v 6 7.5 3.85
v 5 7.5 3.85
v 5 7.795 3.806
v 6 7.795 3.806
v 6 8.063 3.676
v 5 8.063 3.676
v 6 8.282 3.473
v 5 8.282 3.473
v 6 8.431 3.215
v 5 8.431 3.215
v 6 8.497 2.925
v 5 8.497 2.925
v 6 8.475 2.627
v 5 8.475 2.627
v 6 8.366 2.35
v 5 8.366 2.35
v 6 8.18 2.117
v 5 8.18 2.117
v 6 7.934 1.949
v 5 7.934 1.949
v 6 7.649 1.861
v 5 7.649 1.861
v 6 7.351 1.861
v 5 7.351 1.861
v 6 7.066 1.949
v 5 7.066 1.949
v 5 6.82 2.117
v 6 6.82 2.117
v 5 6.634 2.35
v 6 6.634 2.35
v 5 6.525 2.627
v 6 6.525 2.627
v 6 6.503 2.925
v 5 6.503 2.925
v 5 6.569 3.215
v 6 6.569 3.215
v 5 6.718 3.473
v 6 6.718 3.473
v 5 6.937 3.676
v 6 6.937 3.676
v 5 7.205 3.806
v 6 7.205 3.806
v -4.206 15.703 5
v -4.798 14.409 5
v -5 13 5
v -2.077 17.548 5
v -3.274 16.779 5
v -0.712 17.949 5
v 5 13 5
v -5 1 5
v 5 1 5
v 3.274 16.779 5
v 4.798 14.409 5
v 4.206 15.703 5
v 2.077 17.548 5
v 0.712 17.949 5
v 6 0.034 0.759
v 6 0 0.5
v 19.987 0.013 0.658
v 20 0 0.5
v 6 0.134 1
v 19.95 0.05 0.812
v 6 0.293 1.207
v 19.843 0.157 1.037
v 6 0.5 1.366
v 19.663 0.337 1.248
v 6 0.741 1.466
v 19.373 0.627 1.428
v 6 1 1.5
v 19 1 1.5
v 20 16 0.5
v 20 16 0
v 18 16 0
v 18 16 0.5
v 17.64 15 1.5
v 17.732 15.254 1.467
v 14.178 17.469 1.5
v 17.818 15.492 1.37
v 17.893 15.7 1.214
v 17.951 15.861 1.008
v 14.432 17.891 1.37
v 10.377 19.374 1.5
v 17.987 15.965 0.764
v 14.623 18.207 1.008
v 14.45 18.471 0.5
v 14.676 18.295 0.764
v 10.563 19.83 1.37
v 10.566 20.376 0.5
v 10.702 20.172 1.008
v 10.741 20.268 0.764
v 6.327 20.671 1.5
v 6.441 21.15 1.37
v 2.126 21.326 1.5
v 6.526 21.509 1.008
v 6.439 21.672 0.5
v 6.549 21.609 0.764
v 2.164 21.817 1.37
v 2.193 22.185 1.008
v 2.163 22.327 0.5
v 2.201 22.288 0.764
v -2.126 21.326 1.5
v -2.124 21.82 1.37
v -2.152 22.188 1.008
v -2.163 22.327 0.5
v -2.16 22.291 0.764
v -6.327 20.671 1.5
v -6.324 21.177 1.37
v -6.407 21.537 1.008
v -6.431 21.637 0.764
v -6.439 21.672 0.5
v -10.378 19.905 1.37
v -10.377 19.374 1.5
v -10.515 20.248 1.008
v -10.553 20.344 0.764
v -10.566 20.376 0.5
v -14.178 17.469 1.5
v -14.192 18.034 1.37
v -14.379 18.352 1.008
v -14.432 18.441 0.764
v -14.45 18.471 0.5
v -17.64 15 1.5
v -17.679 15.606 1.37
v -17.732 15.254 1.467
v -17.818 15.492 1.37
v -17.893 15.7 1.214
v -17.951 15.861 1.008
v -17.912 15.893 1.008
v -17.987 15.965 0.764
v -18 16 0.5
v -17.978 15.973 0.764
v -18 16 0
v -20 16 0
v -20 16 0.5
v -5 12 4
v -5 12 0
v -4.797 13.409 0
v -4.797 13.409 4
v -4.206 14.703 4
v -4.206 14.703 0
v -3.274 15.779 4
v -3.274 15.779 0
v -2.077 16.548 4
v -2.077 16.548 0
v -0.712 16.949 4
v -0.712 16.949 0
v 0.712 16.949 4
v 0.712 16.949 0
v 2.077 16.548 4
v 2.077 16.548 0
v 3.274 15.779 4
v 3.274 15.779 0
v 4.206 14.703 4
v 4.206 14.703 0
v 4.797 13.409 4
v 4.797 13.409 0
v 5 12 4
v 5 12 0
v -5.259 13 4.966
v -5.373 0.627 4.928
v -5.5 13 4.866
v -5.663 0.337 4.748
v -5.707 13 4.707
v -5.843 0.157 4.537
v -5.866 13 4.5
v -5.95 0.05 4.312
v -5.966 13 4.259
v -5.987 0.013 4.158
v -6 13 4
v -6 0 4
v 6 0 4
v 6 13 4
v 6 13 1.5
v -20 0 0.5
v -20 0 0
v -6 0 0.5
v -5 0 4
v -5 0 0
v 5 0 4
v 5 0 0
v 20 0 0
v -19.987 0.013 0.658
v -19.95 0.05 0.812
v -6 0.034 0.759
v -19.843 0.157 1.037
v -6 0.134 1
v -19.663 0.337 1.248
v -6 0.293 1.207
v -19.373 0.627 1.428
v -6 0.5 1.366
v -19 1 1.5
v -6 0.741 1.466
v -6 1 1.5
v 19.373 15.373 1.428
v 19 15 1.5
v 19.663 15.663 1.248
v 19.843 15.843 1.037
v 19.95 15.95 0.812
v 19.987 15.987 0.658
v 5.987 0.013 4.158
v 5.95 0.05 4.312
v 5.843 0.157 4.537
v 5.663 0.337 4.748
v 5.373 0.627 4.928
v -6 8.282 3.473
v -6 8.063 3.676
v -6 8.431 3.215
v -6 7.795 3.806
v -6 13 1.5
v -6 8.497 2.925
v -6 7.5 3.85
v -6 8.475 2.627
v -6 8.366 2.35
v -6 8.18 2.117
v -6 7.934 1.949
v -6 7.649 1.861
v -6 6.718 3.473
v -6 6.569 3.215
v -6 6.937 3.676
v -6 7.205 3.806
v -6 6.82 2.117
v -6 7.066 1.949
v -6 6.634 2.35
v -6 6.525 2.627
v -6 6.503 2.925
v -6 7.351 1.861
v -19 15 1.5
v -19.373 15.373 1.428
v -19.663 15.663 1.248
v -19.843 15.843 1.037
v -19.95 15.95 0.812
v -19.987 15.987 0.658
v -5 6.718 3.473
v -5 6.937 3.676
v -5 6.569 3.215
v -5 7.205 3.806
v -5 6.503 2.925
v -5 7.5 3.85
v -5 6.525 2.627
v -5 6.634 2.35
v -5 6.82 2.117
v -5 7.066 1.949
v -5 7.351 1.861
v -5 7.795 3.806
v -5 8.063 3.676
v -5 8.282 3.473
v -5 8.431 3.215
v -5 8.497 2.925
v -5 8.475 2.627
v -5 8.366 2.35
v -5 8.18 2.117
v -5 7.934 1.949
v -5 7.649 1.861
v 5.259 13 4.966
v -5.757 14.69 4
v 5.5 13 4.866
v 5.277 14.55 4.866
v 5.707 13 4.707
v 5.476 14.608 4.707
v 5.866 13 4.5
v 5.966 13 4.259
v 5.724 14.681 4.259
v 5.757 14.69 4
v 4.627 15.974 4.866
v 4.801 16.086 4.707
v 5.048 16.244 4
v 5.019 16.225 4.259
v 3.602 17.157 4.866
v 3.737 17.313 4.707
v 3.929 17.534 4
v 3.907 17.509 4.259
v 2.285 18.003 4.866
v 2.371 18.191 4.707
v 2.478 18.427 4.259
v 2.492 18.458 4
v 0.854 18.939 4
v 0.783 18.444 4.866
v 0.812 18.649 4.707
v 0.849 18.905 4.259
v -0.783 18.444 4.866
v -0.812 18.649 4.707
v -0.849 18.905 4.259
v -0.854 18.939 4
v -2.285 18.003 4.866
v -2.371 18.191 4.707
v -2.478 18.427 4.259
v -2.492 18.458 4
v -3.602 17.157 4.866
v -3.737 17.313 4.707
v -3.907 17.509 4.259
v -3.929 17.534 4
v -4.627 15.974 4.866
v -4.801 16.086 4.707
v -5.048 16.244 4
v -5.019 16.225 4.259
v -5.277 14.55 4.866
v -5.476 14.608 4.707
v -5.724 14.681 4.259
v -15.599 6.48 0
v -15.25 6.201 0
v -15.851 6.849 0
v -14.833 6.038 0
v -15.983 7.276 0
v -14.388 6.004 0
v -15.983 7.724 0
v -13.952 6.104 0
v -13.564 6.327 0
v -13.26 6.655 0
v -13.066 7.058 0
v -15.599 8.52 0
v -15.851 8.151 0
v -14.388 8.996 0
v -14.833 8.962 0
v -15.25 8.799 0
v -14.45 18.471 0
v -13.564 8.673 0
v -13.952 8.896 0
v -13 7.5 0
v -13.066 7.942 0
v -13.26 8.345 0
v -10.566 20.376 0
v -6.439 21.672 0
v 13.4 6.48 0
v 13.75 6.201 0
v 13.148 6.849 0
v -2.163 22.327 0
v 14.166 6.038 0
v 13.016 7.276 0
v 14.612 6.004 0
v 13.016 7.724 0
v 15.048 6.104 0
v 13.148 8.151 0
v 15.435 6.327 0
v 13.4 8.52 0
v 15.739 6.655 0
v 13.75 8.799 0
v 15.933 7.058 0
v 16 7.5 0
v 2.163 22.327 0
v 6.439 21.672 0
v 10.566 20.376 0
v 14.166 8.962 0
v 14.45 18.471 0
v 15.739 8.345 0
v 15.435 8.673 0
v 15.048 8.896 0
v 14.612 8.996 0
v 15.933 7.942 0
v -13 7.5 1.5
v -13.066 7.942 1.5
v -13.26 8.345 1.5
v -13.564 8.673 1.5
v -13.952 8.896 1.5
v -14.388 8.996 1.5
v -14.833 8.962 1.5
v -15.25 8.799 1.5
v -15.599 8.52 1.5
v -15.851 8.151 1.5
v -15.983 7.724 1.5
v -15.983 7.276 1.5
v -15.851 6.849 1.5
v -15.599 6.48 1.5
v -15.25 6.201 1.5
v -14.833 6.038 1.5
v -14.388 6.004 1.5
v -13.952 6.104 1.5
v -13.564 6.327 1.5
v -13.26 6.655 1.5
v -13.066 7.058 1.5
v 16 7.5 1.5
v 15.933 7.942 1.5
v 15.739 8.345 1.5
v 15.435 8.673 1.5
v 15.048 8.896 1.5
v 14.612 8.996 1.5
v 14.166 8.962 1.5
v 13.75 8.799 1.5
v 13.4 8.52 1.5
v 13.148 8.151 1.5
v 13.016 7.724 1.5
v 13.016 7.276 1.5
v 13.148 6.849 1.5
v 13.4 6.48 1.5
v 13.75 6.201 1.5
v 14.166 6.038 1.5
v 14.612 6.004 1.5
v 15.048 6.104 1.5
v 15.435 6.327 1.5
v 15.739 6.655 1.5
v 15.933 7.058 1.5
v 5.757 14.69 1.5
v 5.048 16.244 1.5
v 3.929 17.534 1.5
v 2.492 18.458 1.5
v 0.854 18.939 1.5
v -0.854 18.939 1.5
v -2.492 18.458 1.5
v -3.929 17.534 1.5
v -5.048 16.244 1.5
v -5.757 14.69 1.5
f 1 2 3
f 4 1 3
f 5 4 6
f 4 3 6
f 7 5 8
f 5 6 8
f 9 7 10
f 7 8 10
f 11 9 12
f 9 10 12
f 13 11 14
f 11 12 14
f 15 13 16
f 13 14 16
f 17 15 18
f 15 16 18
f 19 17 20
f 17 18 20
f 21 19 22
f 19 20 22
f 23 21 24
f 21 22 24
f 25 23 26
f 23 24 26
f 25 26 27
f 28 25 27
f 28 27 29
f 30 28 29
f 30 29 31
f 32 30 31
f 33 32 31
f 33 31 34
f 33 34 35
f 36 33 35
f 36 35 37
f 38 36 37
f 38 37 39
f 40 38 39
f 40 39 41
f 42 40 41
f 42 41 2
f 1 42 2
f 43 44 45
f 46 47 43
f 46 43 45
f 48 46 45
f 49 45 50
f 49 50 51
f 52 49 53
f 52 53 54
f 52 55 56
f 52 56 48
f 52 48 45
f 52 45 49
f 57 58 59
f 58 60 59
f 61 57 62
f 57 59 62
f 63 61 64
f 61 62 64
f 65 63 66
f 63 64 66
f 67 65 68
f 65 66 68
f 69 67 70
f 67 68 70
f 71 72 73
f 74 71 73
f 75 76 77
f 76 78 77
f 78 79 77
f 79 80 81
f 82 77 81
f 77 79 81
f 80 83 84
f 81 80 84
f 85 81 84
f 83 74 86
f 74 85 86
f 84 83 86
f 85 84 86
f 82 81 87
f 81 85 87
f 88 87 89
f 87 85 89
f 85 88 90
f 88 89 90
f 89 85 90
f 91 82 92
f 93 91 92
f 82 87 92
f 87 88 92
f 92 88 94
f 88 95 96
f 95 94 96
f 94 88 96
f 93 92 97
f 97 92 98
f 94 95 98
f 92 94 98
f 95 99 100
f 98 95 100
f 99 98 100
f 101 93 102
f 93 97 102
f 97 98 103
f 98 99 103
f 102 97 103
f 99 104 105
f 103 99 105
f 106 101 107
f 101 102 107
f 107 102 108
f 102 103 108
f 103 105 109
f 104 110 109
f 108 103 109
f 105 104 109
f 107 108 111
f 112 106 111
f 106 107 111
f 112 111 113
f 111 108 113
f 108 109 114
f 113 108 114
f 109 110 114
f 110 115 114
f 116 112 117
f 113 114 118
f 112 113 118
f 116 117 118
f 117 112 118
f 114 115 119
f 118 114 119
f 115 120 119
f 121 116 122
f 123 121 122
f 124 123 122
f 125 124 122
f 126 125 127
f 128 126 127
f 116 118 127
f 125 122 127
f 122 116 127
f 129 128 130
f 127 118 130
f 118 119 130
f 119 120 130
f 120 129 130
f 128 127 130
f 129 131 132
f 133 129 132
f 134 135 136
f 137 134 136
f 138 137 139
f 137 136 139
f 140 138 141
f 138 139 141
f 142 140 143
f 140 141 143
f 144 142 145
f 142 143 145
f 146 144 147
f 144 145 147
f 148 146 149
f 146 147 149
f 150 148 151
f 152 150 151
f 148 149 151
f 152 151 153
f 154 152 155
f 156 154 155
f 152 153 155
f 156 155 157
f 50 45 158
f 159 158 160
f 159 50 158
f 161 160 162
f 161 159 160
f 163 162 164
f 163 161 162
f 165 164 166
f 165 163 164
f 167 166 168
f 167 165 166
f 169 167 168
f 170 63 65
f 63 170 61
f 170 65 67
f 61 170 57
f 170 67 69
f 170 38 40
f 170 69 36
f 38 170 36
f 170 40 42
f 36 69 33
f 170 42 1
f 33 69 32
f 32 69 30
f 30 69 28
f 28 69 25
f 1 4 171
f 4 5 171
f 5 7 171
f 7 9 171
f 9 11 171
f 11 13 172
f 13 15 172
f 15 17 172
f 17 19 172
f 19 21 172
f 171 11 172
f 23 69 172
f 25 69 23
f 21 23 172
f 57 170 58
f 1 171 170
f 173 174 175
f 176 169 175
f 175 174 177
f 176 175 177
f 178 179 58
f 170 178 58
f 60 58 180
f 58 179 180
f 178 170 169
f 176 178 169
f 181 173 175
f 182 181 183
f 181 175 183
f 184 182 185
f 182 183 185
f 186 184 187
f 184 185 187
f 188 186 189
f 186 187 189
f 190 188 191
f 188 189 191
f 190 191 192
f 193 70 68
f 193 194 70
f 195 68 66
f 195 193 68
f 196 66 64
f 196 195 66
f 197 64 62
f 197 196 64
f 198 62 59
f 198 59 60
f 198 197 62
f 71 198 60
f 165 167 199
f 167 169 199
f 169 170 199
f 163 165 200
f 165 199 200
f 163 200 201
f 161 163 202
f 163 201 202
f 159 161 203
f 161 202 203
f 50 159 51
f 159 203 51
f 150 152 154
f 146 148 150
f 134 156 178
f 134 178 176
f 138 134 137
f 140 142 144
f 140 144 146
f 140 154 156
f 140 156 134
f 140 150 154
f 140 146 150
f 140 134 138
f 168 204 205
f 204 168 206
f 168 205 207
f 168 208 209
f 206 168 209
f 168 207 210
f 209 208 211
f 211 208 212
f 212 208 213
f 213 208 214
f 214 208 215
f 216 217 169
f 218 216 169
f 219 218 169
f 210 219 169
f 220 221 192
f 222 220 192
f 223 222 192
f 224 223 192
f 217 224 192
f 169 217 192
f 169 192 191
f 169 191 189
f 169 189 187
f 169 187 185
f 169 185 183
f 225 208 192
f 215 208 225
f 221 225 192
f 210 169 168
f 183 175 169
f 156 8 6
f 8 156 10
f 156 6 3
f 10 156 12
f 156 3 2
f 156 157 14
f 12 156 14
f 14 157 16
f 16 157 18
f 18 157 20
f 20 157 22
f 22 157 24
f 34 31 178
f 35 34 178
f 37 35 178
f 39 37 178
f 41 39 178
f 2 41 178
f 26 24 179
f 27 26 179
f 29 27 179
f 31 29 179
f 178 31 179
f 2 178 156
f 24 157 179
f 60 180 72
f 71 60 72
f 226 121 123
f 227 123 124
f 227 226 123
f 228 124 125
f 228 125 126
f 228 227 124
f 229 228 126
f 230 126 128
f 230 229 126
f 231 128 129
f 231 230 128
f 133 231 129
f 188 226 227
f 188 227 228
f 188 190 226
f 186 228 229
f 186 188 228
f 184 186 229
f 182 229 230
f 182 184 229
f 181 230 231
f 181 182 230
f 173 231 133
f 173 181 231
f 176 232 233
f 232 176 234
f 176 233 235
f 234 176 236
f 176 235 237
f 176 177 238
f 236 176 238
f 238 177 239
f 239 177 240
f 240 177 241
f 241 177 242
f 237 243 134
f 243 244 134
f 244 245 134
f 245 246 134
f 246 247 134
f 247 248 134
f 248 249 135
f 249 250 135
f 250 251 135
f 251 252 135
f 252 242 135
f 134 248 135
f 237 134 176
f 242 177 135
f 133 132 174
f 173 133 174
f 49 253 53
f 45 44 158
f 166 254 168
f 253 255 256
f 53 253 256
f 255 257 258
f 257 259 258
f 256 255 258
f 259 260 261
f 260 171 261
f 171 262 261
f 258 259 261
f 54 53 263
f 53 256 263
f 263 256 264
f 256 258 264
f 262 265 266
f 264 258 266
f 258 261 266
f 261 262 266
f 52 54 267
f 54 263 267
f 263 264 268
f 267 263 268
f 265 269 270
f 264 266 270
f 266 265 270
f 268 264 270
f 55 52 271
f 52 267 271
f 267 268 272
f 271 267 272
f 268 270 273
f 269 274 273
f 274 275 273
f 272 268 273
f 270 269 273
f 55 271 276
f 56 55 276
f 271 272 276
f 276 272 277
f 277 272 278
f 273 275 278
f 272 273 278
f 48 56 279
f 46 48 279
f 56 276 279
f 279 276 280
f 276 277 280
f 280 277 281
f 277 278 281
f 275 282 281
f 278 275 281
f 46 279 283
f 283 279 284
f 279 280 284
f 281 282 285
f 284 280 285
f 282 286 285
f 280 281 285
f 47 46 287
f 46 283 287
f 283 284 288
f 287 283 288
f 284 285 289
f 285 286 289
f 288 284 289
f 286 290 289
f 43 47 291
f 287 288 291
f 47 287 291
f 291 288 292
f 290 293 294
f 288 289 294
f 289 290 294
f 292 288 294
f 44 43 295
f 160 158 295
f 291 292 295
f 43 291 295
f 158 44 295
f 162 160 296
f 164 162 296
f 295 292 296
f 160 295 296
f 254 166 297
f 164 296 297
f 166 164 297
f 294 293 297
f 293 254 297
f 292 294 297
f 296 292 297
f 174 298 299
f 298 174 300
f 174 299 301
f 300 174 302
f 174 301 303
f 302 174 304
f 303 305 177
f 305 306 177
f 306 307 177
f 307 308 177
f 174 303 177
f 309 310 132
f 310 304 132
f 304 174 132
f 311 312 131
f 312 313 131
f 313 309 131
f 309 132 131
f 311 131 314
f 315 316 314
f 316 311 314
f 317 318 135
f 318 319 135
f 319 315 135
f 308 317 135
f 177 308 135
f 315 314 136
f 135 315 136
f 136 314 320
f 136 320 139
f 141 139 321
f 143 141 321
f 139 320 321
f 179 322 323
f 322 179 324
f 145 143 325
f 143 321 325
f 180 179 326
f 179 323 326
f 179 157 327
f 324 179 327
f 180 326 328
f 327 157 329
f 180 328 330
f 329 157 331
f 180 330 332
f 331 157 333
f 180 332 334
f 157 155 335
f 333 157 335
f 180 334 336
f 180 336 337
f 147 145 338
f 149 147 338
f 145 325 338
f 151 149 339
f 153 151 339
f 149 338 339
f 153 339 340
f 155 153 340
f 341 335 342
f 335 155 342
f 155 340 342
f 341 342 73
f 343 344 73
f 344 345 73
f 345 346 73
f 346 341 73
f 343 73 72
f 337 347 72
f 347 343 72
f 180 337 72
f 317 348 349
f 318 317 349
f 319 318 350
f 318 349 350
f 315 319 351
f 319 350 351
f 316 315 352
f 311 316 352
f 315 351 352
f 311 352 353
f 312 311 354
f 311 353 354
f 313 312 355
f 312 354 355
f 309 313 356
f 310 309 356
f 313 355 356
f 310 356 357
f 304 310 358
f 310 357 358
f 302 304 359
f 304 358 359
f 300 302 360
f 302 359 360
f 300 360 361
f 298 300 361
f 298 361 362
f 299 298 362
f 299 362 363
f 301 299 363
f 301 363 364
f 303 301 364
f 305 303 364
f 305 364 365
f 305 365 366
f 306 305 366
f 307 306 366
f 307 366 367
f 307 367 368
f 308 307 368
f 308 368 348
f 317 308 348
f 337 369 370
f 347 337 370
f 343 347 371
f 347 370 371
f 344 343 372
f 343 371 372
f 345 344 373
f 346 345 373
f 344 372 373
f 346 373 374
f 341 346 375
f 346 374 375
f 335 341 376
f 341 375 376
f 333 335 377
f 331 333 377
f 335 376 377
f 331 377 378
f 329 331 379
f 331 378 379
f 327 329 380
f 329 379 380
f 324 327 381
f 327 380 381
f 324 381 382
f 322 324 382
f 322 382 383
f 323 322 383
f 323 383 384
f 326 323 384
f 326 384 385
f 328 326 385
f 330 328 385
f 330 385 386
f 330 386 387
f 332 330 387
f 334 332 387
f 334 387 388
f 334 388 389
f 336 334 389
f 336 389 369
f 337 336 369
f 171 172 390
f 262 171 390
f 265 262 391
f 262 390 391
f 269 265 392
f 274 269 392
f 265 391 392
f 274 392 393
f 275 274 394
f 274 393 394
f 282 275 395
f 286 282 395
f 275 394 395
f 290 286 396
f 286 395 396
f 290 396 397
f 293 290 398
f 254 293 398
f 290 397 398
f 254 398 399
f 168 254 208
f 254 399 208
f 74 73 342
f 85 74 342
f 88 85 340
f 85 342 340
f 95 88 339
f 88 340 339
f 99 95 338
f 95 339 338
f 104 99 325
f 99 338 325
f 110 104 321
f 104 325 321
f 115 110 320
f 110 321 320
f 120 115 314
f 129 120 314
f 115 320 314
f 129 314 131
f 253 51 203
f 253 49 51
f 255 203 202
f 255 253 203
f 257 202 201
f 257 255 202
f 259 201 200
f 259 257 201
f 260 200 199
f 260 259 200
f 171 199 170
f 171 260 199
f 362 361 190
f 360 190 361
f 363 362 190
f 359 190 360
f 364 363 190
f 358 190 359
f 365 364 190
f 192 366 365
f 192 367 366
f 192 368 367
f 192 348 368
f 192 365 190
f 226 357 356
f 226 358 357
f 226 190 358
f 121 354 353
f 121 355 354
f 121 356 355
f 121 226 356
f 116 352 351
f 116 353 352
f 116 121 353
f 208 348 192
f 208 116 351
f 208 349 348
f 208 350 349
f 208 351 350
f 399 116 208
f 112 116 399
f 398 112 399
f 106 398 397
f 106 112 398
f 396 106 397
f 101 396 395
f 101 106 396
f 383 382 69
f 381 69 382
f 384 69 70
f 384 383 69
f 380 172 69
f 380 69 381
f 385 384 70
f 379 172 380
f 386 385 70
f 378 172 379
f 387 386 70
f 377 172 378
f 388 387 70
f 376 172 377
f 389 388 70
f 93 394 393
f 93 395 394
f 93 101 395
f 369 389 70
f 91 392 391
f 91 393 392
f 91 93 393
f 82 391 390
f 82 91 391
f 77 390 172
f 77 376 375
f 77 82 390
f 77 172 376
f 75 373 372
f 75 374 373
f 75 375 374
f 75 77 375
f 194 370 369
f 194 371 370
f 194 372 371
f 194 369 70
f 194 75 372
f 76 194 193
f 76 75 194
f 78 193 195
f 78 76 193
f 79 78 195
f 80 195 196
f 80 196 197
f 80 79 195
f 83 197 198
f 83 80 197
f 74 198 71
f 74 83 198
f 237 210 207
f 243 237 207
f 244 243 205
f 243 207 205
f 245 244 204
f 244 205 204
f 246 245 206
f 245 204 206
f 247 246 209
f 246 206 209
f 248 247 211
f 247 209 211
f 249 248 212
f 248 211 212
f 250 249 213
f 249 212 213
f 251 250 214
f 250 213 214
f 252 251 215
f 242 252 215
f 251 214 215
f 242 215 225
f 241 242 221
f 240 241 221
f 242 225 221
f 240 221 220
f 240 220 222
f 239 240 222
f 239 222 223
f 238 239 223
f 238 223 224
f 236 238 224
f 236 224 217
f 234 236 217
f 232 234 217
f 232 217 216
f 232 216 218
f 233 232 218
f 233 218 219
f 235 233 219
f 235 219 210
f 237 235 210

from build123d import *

# Parameters (mm, degrees)
BOSS_EXTRUDE1_DEPTH = 1.5
BOSS_EXTRUDE2_DEPTH = 3.5
CUT_EXTRUDE1_DEPTH  = 4
FILLET1_R           = 1
FILLET4_R           = 1
SKETCH5_R           = 1.5
CUT_EXTRUDE3_DEPTH  = 12
SKETCH4_R           = 1
CUT_EXTRUDE5_DEPTH  = 20


with BuildPart() as part:
    # Sketch1 → Boss-Extrude1 (new body)
    with BuildSketch(Plane.XY):
        with BuildLine():
            Line((0, 0), (20, 0))
            Line((20, 0), (20, 16))
            Line((20, 16), (18, 16))
            ThreePointArc((18, 16), (0, 22.408858912), (-18, 16))
            Line((-18, 16), (-20, 16))
            Line((-20, 16), (-20, 0))
            Line((-20, 0), (0, 0))
        make_face()
    extrude(amount=BOSS_EXTRUDE1_DEPTH)

    # Sketch2 → Boss-Extrude2 (add)
    with BuildSketch(Plane.XY.offset(1.5)):
        with BuildLine():
            Line((6, 0), (6, 13))
            ThreePointArc((6, 13), (0, 19), (-6, 13))
            Line((-6, 13), (-6, 0))
            Line((-6, 0), (6, 0))
        make_face()
    extrude(amount=BOSS_EXTRUDE2_DEPTH)

    # Sketch3 → Cut-Extrude1 (cut)
    with BuildSketch(Plane(origin=(0, 0, 0), x_dir=(-1, 0, 0), z_dir=(0, 0, -1))):
        with BuildLine():
            Line((0, 0), (5, 0))
            Line((5, 0), (5, 12))
            ThreePointArc((5, 12), (0, 17), (-5, 12))
            Line((-5, 12), (-5, 0))
            Line((-5, 0), (0, 0))
        make_face()
    extrude(amount=-CUT_EXTRUDE1_DEPTH, mode=Mode.SUBTRACT)

    # Fillet1
    fillet1_edges = [part.edges().sort_by_distance(p)[0] for p in [
        (-6, 6.5, 5),
        (0, 19, 5),
        (0, 0, 5),
        (6, 6.5, 5),
    ]]
    fillet(fillet1_edges, radius=FILLET1_R - 0.0001)  # a hair under: the kernel refuses the full size

    # Fillet4
    fillet4_edges = [part.edges().sort_by_distance(p)[0] for p in [
        (20, 8, 1.5),
        (19, 16, 1.5),
        (0, 22.408858912, 1.5),
        (13, 0, 1.5),
        (-19, 16, 1.5),
        (-20, 8, 1.5),
        (-13, 0, 1.5),
    ]]
    fillet(fillet4_edges, radius=FILLET4_R)

    # Sketch5 → Cut-Extrude3 (cut)
    with BuildSketch(Plane.XY.offset(1.5)):
        with Locations((14.499595769, 7.5)):
            Circle(SKETCH5_R)
        with Locations((-14.499595769, 7.5)):
            Circle(SKETCH5_R)
    extrude(amount=-CUT_EXTRUDE3_DEPTH, mode=Mode.SUBTRACT)

    # Sketch4 → Cut-Extrude5 (cut)
    with BuildSketch(Plane.ZY.offset(6)):
        with Locations((2.85, 7.5)):
            Circle(SKETCH4_R)
    extrude(amount=-CUT_EXTRUDE5_DEPTH, mode=Mode.SUBTRACT)


solid = part.part
